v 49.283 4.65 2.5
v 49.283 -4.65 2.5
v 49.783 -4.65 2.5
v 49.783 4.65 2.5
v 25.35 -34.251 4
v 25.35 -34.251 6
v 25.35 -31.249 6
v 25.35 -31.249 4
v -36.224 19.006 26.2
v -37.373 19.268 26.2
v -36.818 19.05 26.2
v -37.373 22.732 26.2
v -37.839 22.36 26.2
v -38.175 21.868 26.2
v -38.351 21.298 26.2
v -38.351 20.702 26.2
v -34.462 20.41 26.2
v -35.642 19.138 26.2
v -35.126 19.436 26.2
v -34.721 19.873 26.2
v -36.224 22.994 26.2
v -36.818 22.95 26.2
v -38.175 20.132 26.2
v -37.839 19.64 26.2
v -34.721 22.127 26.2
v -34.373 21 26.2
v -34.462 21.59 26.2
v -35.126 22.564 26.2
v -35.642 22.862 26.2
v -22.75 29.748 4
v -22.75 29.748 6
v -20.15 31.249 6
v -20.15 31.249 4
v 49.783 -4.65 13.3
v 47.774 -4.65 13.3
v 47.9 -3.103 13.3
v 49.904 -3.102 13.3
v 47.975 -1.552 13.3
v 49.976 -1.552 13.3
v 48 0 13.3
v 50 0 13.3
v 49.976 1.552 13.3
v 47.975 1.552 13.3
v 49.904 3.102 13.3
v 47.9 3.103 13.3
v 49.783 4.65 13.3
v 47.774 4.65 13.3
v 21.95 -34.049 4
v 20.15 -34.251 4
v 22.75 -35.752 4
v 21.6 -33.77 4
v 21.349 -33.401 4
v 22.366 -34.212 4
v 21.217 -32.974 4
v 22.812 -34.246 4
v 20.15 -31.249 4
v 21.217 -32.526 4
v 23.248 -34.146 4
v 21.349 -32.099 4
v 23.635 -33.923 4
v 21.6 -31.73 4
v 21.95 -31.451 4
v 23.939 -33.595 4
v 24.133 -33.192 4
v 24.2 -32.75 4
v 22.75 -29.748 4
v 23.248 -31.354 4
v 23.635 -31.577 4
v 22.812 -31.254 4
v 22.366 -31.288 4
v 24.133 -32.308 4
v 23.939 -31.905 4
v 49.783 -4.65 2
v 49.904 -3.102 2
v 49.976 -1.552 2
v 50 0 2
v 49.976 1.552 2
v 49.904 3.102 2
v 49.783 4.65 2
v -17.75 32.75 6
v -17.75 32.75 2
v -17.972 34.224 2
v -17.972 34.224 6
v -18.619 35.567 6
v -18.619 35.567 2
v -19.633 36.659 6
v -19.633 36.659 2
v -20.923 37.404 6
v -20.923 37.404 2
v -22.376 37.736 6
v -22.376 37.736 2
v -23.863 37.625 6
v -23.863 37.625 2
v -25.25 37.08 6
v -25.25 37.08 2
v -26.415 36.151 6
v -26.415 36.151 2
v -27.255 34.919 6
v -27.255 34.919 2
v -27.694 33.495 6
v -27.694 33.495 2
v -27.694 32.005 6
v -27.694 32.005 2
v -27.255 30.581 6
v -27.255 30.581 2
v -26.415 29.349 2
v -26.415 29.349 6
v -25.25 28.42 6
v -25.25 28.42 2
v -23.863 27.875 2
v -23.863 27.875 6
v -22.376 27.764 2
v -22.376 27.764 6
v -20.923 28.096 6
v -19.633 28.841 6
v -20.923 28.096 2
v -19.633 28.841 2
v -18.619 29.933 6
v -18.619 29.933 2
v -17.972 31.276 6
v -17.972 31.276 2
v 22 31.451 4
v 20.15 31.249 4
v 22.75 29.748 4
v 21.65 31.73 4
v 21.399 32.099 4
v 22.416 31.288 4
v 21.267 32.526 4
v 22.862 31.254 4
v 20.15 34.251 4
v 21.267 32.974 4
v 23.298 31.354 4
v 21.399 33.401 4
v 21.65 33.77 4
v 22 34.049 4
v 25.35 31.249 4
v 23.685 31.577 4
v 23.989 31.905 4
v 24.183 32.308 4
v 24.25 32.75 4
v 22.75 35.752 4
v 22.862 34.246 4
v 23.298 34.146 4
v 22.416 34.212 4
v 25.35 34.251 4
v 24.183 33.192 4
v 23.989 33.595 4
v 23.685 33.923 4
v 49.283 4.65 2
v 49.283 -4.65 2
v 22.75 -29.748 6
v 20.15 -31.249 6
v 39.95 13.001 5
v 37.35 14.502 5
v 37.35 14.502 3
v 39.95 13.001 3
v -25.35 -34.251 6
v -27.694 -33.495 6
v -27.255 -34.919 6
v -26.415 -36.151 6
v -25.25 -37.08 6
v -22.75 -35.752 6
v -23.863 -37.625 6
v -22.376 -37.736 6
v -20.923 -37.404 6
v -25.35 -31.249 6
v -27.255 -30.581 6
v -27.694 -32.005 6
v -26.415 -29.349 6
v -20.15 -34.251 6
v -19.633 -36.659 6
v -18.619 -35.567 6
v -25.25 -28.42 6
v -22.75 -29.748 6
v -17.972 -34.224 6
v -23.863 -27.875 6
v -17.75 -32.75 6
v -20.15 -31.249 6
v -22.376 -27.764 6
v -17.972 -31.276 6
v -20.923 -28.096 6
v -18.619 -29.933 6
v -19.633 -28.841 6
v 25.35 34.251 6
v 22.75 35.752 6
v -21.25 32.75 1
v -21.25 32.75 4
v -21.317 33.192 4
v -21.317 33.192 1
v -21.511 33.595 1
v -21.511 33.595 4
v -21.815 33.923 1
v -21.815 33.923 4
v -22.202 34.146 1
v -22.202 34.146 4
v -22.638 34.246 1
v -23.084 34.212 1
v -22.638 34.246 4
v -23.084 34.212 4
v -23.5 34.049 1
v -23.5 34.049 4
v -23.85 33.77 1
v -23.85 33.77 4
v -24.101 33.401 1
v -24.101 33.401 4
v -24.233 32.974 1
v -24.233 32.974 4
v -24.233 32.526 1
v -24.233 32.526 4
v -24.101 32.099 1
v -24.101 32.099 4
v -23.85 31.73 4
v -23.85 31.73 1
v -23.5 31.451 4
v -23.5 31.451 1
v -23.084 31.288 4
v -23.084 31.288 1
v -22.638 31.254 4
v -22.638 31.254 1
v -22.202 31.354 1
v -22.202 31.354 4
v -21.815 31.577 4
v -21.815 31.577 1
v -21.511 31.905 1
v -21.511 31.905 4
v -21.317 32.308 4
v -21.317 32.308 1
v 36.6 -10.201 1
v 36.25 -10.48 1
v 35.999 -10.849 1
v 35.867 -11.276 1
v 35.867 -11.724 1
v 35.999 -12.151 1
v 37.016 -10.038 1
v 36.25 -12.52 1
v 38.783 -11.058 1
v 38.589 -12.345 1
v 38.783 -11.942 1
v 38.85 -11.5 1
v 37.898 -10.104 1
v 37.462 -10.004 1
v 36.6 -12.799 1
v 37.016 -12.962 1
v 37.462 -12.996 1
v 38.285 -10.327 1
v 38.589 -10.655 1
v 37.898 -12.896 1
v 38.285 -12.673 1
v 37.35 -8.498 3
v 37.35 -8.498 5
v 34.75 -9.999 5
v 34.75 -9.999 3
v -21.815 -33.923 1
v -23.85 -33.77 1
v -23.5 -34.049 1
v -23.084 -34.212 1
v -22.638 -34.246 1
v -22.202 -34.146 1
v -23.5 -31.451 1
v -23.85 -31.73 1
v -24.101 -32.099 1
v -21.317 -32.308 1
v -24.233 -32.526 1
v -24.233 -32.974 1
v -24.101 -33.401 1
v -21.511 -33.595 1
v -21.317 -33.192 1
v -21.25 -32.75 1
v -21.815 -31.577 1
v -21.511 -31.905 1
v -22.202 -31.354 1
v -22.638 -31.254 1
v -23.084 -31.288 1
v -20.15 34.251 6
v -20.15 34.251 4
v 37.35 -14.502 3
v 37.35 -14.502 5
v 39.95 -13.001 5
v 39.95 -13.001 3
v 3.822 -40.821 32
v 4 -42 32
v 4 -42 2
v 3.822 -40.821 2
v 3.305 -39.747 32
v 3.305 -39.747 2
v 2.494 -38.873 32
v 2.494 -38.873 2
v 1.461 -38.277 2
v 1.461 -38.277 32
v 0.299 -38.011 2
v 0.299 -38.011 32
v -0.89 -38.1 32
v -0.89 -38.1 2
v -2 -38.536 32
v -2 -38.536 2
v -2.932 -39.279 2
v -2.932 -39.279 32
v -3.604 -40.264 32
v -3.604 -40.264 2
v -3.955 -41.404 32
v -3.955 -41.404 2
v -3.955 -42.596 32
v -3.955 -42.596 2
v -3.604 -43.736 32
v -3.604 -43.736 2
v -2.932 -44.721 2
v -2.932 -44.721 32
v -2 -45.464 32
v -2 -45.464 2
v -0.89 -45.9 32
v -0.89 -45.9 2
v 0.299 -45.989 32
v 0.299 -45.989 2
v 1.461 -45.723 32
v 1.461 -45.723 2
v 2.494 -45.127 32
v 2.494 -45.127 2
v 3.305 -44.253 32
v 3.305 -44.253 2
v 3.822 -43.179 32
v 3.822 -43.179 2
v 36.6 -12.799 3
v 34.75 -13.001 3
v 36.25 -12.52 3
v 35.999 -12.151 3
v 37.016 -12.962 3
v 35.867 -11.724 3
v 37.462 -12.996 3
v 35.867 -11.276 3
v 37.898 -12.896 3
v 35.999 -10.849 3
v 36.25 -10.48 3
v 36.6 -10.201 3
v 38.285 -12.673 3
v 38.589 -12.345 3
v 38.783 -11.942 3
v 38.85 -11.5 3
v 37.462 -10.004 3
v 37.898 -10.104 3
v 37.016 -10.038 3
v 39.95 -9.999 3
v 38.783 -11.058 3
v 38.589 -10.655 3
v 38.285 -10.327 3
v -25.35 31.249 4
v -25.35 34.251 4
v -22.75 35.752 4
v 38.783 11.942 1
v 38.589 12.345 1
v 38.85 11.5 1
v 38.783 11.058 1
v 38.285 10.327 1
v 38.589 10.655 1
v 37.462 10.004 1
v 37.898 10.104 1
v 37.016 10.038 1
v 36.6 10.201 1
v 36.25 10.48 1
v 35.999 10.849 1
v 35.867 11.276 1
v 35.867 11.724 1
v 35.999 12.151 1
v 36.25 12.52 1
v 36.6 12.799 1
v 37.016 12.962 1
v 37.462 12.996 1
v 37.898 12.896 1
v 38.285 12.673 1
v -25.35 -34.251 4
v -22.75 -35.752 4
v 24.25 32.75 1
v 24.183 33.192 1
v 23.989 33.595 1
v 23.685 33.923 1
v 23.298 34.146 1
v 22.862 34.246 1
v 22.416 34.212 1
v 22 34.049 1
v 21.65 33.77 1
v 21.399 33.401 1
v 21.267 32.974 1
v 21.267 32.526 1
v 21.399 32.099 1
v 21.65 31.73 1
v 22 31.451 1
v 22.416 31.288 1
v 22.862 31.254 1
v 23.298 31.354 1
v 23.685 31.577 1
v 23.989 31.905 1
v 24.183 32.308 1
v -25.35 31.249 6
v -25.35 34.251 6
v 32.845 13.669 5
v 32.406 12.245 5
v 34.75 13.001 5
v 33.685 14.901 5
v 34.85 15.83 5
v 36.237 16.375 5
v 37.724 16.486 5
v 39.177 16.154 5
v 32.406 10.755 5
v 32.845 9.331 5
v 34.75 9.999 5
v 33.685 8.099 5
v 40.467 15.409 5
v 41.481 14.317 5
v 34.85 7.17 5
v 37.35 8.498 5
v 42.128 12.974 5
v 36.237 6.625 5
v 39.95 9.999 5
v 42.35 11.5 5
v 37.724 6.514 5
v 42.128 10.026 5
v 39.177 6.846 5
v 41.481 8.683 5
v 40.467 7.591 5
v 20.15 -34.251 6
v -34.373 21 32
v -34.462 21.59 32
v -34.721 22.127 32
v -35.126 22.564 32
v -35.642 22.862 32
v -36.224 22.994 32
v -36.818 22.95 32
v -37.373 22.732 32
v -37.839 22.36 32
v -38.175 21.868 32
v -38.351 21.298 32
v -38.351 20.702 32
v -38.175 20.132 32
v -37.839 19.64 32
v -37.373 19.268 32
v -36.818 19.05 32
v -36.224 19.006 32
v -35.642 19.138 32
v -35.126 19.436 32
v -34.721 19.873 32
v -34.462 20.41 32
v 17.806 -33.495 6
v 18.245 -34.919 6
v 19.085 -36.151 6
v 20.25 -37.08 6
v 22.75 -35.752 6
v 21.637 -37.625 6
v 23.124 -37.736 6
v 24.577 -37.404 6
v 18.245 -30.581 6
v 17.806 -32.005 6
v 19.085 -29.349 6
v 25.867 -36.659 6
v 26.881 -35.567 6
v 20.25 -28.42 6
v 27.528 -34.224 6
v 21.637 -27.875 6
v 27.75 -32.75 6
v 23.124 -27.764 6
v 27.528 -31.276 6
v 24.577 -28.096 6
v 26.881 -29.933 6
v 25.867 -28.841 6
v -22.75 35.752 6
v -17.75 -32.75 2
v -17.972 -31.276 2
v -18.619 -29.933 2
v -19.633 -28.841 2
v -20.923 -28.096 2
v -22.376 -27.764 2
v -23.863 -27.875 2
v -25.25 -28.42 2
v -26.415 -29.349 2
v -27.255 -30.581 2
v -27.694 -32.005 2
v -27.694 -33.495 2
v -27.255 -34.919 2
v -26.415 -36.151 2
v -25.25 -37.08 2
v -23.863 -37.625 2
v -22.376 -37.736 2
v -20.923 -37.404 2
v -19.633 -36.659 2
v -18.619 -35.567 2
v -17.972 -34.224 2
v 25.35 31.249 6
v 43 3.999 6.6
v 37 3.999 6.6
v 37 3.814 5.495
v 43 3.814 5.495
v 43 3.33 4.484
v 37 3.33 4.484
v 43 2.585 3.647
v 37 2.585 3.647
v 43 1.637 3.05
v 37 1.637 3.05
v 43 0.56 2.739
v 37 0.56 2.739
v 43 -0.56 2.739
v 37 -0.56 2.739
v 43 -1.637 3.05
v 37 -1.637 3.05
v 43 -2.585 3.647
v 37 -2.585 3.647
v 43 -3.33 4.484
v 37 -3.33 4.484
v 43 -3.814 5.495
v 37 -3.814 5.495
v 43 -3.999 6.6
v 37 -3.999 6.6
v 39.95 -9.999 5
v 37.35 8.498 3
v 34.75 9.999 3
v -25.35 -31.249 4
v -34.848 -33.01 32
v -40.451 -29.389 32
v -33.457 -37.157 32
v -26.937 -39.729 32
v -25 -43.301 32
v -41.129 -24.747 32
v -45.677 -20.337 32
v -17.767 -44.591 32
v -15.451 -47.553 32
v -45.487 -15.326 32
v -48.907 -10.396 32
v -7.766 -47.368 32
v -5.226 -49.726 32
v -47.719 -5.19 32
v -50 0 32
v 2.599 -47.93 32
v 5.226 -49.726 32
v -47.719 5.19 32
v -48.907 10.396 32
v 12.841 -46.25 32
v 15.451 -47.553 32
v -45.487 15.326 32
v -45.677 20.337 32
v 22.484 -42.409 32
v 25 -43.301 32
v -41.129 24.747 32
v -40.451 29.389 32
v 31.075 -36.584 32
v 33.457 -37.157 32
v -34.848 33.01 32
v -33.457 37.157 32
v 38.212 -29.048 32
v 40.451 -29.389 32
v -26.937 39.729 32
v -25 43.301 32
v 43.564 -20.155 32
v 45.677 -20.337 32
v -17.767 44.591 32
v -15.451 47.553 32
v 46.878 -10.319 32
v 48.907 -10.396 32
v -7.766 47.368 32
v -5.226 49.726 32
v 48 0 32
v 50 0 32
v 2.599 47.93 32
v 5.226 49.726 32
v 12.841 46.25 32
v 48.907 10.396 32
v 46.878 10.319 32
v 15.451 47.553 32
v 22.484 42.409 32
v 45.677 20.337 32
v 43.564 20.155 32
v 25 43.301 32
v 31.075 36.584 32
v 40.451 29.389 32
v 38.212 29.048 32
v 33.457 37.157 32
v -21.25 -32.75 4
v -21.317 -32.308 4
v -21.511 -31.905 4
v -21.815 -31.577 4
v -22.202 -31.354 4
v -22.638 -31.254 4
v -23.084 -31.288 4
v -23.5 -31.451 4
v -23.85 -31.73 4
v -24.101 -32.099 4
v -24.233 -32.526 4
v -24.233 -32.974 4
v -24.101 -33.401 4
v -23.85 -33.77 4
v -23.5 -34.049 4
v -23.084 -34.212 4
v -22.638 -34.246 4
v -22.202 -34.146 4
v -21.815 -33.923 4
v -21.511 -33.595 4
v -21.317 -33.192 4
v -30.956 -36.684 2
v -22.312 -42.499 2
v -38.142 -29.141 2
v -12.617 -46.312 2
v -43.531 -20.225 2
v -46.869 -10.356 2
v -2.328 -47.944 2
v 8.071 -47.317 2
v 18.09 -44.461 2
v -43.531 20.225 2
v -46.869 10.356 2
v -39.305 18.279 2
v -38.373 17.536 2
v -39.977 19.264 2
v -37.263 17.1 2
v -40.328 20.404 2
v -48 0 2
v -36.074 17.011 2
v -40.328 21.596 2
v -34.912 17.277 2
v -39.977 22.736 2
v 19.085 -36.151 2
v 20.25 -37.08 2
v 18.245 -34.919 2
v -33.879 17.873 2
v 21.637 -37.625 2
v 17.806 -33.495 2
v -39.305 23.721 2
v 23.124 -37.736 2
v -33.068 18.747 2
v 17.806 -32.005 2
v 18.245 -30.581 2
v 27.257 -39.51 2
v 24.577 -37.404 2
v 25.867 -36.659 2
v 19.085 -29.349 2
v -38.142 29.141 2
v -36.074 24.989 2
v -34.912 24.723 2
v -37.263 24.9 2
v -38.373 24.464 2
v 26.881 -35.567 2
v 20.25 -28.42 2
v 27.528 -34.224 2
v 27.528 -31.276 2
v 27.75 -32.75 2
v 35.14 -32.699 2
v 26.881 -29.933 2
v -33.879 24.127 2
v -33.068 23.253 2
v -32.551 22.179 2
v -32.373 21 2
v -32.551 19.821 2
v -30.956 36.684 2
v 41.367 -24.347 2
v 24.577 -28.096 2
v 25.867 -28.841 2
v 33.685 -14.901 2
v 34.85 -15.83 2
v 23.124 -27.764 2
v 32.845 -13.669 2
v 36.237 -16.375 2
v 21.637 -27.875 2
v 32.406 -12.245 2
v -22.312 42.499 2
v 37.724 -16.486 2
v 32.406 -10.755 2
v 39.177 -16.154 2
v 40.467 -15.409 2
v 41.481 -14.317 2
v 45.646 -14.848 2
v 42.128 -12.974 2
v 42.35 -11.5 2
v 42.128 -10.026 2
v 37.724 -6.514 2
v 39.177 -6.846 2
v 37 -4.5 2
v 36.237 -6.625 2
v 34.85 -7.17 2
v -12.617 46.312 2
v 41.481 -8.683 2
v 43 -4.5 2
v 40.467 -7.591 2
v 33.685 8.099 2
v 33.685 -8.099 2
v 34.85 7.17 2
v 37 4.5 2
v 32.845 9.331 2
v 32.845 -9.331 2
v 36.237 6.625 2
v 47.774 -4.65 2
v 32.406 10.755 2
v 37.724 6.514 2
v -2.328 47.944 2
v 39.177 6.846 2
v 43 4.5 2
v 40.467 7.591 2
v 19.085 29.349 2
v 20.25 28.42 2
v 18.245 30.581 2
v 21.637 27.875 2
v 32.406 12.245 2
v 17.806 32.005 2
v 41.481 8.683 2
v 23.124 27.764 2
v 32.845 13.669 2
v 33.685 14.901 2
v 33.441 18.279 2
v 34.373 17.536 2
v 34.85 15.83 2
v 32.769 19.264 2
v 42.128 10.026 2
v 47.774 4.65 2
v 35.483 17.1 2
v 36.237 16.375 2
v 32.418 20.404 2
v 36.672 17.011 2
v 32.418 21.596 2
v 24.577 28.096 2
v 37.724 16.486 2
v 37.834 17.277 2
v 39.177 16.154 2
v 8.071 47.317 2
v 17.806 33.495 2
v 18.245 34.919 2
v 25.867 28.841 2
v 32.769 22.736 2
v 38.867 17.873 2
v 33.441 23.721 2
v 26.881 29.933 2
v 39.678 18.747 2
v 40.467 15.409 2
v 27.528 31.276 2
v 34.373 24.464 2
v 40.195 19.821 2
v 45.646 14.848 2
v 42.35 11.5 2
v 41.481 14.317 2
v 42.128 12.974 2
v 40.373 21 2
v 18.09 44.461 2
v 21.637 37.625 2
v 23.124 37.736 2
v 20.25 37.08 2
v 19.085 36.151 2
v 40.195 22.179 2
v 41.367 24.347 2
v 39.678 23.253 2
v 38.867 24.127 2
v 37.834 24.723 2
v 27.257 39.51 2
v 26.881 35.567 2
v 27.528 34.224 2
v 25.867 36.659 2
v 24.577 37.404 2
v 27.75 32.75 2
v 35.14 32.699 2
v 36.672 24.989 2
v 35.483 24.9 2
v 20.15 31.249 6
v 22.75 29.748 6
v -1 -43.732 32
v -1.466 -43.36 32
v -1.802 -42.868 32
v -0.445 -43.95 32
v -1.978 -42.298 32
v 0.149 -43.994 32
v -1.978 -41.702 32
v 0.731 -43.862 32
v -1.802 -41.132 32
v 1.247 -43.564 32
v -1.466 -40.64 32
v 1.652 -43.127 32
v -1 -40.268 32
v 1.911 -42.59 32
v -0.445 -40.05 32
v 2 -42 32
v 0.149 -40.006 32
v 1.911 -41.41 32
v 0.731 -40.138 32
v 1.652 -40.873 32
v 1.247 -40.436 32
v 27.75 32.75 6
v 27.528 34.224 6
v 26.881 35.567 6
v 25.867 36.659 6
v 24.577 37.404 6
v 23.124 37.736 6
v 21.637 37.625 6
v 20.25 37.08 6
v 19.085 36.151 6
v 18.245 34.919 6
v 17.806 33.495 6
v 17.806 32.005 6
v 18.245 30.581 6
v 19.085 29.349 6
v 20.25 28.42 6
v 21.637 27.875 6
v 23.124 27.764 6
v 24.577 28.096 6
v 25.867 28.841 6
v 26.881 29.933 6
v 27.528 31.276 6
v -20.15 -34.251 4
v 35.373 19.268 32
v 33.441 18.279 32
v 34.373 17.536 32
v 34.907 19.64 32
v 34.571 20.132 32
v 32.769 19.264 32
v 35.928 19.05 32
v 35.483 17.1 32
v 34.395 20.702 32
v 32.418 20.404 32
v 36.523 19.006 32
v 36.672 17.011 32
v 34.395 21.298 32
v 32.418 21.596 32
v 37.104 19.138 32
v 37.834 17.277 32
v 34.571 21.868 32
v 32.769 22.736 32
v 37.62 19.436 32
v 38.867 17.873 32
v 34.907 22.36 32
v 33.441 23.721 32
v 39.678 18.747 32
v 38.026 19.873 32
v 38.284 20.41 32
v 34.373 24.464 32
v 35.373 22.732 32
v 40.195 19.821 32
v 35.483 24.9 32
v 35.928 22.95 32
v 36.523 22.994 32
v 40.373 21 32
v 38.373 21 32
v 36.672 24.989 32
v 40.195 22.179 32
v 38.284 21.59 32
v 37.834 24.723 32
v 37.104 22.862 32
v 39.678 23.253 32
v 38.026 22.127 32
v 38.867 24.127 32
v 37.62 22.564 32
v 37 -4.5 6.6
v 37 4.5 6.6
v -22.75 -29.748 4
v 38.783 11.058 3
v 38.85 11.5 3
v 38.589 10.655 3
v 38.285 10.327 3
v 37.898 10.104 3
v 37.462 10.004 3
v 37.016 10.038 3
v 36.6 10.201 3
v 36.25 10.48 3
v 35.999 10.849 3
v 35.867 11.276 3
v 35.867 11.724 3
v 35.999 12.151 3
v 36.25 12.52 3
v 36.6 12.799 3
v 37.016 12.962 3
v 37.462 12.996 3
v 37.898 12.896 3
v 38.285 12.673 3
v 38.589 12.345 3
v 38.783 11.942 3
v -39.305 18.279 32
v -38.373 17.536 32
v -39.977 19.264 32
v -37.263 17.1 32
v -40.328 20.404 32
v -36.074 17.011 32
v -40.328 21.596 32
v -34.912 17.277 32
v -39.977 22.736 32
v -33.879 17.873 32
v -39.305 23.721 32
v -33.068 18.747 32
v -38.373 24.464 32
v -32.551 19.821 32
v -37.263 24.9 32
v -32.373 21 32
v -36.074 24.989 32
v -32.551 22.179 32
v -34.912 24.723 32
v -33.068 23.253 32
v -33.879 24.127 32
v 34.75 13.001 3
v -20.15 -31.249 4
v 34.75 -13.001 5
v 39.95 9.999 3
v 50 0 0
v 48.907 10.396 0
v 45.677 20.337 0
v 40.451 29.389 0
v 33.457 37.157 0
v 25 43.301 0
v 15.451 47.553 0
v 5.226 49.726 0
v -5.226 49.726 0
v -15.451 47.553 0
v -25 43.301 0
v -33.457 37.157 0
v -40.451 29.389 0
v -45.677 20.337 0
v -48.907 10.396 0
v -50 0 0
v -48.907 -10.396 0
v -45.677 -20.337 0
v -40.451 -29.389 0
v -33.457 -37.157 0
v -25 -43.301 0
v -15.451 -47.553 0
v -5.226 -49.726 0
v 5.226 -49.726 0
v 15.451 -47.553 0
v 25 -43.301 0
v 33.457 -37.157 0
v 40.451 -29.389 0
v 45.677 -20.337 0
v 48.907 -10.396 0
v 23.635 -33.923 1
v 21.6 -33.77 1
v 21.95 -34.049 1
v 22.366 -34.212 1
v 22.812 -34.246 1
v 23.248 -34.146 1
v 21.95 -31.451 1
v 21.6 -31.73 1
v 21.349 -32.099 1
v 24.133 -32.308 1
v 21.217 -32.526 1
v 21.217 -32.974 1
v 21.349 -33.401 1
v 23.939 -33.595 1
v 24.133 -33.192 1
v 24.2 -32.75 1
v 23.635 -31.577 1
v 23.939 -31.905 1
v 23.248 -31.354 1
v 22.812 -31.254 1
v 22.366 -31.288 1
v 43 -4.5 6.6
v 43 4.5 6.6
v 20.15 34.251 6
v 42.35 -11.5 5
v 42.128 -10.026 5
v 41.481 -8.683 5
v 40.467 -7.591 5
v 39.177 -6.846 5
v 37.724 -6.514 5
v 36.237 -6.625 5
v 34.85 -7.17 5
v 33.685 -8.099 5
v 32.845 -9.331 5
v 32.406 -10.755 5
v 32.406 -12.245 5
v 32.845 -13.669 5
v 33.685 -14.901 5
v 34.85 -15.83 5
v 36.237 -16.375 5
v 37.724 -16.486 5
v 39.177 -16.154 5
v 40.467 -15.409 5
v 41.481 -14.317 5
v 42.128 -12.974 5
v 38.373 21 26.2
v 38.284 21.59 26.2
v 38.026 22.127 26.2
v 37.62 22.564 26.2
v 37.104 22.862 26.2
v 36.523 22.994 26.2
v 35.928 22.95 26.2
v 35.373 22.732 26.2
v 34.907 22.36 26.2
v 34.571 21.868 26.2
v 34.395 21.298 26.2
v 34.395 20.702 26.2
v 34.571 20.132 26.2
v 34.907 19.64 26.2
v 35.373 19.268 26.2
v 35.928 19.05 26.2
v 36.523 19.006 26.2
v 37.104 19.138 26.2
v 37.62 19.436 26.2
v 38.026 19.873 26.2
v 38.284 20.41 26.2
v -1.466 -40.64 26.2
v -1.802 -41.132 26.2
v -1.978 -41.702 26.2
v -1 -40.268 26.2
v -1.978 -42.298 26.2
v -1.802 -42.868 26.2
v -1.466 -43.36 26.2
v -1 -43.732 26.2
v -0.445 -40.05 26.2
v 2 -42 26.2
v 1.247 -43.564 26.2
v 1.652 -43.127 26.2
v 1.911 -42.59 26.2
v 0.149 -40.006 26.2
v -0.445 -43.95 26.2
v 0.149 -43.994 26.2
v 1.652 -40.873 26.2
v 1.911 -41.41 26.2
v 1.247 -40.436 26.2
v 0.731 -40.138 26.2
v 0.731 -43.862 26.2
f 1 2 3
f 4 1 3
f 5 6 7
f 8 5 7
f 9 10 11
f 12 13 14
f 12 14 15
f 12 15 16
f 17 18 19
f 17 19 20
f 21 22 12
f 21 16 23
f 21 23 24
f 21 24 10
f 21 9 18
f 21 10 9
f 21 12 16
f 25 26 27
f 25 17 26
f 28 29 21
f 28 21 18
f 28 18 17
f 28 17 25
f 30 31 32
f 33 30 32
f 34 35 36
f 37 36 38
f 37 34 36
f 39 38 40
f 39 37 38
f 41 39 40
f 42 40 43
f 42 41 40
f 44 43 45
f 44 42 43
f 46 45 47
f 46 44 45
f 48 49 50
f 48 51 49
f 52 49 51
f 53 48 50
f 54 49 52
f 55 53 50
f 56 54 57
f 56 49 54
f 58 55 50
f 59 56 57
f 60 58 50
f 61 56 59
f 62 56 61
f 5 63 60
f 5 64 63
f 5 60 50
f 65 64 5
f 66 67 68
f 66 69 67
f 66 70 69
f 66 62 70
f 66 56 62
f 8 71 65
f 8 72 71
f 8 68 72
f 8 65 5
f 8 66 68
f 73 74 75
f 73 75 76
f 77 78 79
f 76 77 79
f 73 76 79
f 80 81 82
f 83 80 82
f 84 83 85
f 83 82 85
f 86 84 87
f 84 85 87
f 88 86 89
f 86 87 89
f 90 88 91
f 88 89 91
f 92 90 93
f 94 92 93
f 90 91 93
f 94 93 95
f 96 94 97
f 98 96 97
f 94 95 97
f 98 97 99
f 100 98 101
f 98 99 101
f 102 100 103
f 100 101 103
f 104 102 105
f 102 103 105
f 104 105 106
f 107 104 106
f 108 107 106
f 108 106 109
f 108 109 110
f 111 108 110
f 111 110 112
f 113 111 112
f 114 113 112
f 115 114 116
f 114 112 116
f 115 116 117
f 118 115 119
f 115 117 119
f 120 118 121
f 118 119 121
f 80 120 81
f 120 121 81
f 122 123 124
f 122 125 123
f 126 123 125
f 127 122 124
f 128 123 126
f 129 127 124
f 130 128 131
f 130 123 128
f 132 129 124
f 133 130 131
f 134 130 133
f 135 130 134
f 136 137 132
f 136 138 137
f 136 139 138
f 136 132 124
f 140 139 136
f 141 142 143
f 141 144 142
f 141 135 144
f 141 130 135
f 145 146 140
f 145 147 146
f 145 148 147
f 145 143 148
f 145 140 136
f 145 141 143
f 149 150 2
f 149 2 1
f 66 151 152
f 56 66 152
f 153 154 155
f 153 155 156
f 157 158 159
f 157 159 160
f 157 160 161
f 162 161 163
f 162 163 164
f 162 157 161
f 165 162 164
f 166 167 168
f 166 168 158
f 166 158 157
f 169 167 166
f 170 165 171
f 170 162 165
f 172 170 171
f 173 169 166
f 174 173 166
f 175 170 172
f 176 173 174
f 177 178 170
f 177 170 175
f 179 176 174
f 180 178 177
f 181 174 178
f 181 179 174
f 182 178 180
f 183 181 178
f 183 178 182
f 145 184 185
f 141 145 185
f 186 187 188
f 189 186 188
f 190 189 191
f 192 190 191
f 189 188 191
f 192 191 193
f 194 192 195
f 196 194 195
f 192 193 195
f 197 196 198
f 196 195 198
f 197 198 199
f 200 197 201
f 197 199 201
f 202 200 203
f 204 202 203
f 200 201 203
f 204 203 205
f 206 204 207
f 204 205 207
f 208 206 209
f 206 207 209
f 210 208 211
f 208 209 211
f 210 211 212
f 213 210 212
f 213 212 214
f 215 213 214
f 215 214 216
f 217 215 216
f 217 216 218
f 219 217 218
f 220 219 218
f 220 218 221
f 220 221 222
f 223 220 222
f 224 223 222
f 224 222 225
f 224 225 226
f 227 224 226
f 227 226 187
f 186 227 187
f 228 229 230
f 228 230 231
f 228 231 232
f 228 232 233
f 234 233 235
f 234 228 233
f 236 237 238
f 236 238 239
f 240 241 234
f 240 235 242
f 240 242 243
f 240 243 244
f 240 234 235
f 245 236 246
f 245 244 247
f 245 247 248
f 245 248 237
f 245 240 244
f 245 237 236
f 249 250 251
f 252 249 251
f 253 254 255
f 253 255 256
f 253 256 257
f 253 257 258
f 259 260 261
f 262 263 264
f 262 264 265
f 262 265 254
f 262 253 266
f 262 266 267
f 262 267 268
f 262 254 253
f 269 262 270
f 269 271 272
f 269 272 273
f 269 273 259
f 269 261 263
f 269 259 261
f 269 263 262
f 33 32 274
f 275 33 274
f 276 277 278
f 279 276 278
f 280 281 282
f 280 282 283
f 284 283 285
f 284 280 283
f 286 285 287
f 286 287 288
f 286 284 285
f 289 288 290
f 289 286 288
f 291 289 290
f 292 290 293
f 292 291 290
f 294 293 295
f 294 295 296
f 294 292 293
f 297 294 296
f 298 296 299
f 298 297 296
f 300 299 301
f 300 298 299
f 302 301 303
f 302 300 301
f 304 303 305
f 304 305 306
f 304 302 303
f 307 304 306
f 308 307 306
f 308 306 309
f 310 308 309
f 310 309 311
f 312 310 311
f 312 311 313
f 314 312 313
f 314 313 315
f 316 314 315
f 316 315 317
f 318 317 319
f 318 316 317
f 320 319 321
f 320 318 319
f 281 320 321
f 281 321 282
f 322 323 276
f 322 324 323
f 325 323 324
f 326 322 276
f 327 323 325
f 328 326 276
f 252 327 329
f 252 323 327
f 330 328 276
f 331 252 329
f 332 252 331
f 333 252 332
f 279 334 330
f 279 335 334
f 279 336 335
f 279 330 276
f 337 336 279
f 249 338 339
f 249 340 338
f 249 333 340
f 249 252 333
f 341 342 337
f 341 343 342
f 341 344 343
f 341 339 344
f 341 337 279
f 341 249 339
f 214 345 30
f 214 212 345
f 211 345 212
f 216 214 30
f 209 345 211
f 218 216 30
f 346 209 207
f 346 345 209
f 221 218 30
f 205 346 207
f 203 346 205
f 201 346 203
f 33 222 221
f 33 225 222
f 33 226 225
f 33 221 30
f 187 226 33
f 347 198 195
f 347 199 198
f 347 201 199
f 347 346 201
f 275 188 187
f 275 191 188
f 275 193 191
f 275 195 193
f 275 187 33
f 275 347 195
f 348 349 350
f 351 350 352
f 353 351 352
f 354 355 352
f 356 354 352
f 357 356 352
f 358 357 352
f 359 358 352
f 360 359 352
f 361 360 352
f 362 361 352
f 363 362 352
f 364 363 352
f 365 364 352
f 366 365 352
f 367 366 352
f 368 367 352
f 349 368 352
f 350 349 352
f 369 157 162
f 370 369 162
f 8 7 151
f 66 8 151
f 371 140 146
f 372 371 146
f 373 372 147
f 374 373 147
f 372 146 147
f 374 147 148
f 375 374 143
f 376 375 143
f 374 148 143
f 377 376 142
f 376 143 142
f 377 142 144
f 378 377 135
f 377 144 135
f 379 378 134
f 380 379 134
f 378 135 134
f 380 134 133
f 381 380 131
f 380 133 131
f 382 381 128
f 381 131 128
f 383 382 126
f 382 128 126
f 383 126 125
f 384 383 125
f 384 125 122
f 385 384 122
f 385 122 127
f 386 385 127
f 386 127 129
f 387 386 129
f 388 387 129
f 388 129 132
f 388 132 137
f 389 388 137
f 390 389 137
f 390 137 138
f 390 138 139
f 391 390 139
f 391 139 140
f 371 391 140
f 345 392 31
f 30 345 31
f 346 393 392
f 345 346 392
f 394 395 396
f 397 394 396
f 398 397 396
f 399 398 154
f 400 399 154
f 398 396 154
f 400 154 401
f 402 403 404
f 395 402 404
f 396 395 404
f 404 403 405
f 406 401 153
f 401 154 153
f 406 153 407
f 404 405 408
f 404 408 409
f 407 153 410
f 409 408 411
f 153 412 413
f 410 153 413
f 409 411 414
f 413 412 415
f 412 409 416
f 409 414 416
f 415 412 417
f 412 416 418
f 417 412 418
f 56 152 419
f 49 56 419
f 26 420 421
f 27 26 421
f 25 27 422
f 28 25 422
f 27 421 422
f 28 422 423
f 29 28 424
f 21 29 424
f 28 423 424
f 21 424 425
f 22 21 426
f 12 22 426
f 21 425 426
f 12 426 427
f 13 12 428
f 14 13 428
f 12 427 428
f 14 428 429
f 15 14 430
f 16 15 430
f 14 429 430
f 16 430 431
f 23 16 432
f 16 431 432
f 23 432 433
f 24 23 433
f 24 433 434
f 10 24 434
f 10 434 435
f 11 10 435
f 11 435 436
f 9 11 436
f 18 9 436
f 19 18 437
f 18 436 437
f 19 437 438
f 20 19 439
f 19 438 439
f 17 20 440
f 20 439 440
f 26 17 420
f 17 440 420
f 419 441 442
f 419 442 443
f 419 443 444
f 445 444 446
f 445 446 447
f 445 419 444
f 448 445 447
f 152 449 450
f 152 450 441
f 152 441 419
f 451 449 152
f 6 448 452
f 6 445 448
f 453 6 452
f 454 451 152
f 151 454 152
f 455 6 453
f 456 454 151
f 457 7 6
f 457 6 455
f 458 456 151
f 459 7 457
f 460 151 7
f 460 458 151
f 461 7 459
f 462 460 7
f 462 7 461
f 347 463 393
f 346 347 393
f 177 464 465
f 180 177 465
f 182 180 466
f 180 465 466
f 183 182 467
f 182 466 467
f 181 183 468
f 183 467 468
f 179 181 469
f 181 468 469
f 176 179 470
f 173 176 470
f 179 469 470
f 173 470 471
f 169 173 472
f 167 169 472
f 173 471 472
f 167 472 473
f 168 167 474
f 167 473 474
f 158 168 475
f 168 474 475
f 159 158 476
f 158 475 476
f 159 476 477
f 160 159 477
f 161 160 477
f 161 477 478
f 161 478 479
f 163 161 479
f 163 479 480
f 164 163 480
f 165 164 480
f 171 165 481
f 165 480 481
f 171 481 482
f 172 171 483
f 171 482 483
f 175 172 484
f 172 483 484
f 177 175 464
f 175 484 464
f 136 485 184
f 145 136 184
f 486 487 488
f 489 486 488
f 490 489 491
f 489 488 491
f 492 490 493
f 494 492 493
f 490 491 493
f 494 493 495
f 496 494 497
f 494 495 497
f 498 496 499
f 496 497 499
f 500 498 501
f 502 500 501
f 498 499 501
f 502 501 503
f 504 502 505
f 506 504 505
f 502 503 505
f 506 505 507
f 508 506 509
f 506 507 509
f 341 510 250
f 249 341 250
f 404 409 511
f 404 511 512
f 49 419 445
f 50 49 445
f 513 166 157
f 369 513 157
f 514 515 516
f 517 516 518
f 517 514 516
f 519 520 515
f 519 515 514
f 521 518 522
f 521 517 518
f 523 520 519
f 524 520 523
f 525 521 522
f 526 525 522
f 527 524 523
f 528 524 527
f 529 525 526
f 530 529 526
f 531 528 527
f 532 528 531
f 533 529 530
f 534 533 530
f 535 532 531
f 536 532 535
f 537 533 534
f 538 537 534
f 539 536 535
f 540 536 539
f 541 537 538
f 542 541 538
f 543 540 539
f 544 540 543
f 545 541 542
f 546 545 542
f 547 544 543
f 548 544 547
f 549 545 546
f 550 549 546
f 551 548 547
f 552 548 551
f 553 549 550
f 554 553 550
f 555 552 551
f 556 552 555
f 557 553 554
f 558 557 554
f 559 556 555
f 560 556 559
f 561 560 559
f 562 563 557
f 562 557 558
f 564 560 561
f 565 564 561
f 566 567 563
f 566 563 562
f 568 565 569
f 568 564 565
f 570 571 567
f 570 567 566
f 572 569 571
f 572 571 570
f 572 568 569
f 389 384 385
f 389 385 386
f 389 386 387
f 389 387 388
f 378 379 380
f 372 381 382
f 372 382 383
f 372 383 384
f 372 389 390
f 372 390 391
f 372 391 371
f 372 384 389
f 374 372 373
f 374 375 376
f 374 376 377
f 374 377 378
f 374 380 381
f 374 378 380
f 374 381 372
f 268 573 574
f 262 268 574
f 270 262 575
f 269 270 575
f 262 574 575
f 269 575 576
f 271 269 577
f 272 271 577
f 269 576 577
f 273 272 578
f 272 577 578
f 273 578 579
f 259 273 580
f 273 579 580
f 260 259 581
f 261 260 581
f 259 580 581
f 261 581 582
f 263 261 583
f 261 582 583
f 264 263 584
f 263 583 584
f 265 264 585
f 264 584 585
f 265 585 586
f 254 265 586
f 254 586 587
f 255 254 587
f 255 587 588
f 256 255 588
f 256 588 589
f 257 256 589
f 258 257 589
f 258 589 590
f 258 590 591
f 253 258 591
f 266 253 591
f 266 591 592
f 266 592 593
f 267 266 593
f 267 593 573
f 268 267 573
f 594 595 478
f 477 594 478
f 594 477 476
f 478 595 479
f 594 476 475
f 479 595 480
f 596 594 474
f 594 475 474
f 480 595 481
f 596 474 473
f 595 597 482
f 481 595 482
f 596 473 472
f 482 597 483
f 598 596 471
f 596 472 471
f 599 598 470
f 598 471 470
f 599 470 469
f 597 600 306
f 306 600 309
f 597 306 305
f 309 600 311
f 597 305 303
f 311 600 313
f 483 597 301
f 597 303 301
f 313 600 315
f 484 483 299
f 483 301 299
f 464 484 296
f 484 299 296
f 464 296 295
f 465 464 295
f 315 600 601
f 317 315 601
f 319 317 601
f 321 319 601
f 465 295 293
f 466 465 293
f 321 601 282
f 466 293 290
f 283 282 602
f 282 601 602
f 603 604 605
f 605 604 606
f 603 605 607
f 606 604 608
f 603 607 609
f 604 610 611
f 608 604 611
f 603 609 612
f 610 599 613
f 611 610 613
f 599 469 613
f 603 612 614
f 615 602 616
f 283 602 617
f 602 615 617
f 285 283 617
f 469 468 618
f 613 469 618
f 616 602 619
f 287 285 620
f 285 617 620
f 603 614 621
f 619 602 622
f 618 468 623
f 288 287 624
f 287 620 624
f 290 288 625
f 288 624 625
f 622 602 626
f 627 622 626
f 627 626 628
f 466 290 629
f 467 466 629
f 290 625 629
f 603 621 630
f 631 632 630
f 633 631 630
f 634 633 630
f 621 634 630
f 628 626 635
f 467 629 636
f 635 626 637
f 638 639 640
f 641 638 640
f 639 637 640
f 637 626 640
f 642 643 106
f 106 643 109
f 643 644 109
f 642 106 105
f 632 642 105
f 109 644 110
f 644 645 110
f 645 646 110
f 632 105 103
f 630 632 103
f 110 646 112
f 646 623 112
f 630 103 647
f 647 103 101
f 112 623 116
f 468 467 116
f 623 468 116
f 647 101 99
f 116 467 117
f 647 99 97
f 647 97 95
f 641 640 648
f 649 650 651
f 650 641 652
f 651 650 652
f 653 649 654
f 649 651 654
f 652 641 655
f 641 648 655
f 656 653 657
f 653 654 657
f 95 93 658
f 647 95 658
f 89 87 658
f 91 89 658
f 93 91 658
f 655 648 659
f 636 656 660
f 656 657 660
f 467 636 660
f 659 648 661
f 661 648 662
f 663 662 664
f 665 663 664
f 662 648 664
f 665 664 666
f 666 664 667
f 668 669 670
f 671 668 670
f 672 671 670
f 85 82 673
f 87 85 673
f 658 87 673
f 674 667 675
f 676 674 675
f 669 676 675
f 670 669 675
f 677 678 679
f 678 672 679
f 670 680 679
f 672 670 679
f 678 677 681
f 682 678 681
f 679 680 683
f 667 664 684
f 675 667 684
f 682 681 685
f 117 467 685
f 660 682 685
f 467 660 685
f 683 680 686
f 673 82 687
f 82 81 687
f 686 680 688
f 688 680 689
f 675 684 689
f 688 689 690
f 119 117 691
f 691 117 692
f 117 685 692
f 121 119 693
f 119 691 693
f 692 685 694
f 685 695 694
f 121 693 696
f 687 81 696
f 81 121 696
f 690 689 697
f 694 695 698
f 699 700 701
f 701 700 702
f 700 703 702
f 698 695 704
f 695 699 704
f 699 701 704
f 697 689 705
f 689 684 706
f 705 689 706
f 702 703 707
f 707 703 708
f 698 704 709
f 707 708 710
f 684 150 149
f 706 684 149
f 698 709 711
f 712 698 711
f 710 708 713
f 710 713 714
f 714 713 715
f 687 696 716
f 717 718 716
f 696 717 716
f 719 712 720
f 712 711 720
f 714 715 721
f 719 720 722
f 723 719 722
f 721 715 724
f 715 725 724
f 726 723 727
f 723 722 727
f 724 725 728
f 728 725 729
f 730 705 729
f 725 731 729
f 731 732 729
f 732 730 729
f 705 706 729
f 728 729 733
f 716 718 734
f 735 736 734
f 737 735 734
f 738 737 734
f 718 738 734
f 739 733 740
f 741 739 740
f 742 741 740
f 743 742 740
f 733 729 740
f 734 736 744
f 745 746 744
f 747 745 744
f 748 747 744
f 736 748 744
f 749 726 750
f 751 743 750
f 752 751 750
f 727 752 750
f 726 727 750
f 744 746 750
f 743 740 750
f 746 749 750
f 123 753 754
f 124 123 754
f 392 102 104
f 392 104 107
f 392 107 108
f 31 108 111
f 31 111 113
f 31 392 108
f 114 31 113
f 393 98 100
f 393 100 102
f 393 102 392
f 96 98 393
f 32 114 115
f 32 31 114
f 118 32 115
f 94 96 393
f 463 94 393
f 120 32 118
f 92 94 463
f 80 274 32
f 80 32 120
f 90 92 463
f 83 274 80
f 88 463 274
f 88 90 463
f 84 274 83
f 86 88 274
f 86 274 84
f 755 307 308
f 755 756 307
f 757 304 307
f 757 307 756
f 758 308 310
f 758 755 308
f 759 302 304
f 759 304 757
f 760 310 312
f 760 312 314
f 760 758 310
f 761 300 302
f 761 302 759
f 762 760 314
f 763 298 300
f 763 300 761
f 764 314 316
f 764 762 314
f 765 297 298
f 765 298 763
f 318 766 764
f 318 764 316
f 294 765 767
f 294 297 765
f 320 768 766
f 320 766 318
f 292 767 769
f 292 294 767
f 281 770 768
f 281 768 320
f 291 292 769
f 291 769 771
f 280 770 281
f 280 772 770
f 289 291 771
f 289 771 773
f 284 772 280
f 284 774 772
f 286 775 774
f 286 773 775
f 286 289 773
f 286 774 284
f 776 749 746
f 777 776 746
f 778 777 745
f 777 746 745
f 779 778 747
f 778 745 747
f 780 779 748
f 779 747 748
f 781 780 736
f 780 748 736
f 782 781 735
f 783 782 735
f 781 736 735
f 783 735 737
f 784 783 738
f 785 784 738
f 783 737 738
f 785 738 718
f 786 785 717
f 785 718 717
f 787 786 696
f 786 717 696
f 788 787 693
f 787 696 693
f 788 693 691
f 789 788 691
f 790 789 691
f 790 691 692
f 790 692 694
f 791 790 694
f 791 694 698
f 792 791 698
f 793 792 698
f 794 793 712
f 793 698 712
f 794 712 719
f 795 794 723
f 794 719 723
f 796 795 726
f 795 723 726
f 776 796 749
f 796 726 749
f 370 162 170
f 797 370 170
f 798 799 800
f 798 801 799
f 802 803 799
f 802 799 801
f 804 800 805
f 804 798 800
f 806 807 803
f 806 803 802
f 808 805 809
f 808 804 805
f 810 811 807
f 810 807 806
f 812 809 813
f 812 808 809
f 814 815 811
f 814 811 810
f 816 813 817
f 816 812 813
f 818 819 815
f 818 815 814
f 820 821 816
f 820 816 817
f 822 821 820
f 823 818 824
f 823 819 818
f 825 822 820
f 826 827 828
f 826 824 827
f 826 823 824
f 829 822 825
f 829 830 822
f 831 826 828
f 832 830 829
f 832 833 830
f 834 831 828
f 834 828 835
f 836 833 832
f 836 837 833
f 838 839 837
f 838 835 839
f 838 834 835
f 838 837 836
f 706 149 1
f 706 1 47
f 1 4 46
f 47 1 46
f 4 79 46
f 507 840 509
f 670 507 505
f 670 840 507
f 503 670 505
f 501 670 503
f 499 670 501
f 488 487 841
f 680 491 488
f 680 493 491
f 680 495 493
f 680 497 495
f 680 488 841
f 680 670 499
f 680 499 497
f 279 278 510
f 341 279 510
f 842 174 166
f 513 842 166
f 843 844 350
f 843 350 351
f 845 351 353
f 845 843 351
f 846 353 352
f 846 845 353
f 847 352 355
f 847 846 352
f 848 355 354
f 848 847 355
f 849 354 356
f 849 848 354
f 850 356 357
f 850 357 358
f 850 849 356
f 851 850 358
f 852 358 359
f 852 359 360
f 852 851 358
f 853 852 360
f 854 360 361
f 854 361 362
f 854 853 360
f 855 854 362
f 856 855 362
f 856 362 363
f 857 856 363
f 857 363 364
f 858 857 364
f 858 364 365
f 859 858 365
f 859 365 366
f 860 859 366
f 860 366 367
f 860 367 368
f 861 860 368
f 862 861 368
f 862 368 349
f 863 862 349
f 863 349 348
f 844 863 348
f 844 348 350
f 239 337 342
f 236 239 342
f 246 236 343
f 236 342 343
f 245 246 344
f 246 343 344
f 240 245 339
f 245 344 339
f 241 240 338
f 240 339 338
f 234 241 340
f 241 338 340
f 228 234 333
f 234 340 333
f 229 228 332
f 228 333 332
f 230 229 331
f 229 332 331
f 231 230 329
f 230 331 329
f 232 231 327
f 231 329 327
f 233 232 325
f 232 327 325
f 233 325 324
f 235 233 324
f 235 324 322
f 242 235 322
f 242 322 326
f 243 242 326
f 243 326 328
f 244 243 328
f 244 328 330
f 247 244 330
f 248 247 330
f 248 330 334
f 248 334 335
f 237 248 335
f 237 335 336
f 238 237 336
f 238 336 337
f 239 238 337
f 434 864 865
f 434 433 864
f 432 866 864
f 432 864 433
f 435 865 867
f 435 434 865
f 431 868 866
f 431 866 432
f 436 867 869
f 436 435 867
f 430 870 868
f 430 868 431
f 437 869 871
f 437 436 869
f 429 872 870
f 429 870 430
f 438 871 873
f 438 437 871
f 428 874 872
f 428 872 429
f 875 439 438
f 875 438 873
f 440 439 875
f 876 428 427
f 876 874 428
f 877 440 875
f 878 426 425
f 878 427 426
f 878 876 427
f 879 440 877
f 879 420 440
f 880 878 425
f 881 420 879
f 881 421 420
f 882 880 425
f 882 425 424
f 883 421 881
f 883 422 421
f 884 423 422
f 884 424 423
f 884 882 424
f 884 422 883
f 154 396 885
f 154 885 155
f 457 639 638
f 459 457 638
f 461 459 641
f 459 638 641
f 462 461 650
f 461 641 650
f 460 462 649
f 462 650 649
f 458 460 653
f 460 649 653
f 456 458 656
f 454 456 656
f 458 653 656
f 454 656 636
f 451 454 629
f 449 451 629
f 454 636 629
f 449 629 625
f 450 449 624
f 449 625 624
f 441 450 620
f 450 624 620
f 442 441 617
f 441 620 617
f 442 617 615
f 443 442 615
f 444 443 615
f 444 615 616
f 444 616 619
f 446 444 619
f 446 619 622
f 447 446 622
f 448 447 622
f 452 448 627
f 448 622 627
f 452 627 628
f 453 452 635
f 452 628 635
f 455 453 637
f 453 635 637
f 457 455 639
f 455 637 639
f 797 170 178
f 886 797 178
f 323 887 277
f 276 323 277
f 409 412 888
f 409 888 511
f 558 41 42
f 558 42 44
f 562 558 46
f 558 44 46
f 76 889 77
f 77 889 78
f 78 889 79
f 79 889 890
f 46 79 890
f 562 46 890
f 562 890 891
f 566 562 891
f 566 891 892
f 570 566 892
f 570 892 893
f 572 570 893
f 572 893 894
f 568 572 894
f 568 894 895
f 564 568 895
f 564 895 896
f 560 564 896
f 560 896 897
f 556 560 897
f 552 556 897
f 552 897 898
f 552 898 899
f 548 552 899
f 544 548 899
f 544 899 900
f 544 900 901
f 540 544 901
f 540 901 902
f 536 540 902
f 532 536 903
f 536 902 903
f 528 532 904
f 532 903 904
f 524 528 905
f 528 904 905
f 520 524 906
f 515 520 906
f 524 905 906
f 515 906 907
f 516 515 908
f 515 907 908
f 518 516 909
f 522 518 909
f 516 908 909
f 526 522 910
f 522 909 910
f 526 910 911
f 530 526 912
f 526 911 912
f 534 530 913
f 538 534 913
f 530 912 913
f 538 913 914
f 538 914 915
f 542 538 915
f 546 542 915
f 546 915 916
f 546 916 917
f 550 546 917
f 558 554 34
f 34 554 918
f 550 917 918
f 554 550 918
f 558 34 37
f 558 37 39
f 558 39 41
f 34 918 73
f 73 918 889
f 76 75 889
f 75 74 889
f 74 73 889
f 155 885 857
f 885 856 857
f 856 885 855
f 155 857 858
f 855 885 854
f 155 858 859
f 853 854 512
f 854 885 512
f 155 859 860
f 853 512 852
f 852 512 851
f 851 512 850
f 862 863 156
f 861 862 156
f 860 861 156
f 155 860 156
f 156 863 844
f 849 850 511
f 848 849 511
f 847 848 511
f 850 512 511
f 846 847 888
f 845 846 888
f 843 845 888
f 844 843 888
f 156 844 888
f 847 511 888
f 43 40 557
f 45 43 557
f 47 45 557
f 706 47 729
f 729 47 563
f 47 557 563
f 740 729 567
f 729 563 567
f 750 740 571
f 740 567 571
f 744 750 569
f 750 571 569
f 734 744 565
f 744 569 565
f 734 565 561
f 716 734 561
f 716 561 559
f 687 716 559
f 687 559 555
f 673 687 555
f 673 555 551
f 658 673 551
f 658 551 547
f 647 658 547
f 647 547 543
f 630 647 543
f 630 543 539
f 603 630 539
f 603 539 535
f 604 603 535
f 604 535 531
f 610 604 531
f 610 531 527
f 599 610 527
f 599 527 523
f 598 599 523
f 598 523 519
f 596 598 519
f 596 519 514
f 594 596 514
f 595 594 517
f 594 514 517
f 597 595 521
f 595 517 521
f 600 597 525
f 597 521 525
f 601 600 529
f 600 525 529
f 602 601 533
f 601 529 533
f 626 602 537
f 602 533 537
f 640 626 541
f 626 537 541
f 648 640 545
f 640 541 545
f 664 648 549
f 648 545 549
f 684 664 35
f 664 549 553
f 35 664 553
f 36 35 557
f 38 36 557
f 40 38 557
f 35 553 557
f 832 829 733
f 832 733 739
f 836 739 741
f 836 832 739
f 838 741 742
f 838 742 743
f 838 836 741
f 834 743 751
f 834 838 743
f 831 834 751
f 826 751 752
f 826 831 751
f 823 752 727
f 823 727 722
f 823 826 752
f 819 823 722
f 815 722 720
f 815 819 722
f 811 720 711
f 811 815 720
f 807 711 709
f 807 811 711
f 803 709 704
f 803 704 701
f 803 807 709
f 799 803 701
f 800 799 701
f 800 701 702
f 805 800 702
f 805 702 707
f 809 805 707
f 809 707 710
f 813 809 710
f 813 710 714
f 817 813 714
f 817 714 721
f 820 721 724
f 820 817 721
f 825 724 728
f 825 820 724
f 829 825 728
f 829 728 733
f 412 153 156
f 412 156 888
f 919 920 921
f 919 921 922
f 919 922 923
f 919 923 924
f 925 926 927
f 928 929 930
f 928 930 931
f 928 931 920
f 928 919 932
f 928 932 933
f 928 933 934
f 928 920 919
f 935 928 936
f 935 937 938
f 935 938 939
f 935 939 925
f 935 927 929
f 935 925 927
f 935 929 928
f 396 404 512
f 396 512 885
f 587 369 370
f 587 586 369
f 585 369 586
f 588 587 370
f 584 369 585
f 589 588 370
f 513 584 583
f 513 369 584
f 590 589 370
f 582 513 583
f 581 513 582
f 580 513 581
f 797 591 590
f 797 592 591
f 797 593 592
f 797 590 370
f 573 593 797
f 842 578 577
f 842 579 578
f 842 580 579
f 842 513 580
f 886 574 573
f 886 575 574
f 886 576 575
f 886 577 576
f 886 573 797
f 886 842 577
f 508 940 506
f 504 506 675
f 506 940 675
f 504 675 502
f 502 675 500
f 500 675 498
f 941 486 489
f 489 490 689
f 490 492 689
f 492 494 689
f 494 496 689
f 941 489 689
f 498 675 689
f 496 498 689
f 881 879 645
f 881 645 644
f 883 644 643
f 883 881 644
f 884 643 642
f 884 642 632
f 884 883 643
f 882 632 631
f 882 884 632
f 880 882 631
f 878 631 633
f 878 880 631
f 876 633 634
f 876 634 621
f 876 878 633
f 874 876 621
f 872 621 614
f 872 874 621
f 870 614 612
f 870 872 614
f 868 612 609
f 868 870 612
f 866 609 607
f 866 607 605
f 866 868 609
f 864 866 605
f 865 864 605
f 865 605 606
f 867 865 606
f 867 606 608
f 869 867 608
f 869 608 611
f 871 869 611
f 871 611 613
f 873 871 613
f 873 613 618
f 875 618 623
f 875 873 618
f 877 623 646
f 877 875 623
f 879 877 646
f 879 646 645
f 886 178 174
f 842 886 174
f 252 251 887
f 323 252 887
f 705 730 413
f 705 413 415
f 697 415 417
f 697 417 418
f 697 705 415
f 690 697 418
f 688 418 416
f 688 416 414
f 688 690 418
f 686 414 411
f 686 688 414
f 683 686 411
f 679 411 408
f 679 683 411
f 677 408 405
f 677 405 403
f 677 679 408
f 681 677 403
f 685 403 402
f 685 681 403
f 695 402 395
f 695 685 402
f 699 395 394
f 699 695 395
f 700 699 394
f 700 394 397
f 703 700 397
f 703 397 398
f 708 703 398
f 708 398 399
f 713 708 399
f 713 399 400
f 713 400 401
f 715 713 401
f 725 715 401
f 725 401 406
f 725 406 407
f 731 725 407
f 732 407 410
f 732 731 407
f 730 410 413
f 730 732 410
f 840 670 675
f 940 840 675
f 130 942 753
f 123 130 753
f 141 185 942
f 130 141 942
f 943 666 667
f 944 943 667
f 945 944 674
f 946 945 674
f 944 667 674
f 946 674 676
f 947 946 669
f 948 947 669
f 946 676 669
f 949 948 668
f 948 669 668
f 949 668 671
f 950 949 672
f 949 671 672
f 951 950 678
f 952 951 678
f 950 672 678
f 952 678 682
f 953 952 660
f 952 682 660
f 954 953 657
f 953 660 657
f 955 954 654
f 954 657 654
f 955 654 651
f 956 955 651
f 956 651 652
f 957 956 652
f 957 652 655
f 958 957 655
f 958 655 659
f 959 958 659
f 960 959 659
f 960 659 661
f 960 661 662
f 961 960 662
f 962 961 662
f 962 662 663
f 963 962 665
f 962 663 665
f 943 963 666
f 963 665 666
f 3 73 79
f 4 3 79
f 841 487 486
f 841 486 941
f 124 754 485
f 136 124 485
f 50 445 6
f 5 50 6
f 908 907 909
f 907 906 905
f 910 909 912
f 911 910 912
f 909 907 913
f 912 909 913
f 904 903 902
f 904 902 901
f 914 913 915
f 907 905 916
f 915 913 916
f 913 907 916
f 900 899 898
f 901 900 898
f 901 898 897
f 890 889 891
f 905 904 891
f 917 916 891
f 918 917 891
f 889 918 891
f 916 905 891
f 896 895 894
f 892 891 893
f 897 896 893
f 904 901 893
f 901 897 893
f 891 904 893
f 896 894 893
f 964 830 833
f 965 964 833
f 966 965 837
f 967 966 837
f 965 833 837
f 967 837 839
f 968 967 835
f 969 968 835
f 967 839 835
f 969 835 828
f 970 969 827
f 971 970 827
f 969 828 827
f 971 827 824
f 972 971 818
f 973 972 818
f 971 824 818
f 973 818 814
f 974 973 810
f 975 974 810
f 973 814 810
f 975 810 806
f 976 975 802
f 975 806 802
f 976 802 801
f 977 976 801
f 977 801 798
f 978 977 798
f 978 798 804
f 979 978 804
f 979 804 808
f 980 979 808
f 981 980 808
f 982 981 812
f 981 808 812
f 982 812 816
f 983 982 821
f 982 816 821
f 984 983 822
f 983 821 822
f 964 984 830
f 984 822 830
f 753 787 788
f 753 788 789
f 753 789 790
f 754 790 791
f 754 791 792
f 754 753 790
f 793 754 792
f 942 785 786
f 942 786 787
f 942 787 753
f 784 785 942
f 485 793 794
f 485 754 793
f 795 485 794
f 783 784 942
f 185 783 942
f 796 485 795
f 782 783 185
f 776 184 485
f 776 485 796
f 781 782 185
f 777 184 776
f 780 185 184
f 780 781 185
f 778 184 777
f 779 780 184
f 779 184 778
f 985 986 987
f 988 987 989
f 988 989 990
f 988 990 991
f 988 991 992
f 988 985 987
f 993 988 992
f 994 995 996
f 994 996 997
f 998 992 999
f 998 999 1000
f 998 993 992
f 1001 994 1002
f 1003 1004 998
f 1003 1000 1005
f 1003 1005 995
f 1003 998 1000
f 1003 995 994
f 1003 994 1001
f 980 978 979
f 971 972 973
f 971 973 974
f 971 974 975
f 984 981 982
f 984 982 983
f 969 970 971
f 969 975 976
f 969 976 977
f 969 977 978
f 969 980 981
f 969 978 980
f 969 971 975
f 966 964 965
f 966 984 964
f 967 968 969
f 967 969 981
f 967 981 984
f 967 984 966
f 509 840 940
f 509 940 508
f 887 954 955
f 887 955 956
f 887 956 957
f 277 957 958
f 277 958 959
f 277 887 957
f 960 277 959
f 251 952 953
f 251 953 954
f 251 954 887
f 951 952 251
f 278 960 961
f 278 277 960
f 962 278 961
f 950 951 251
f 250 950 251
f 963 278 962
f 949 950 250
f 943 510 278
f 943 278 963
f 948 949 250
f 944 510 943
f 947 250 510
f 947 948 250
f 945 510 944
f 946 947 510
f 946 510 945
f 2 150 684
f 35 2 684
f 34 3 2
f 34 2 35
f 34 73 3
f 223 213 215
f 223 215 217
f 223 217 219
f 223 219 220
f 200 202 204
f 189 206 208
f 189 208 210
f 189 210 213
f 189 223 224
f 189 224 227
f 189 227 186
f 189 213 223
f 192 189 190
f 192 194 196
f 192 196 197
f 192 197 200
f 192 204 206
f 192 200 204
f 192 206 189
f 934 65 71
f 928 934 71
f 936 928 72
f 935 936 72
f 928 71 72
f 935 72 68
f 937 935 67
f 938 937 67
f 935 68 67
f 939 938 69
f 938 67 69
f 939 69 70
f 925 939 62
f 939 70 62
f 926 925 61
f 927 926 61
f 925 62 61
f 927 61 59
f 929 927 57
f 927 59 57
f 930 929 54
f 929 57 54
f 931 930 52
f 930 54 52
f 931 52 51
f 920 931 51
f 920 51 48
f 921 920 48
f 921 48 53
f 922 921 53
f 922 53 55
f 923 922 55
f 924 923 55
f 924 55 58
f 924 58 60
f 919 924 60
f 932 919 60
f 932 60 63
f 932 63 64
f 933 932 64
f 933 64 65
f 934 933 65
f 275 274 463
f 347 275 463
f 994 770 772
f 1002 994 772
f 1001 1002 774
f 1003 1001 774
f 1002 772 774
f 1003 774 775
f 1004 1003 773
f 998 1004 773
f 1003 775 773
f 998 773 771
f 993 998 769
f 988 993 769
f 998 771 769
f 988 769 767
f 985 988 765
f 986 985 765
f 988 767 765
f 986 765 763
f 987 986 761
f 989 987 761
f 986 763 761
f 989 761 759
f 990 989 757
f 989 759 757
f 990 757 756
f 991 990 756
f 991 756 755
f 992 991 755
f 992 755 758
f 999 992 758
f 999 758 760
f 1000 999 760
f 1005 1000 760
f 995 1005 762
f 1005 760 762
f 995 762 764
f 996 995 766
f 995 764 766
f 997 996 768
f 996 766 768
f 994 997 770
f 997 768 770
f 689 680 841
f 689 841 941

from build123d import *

# Parameters (mm, degrees)
SKETCH_R        = 50
PAD_DEPTH       = 32
SKETCH001_R     = 48
POCKET_DEPTH    = 30
SKETCH002_R     = 4
PAD001_DEPTH    = 30
SKETCH005_W     = 9.3
SKETCH005_H     = 11.3
POCKET001_DEPTH = 10
SKETCH006_W     = 6
SKETCH006_H     = 9
PAD004_DEPTH    = 10
POCKET002_DEPTH = 8
SKETCH009_R     = 5
PAD006_DEPTH    = 4
SKETCH011_W     = 0.5
SKETCH011_H     = 9.3
PAD007_DEPTH    = 0.5
SKETCH012_R     = 5
PAD008_DEPTH    = 3
POCKET004_DEPTH = 2
SKETCH014_R     = 1.5
POCKET005_DEPTH = 4
POCKET006_DEPTH = 2
SKETCH015_R     = 1.5
POCKET007_DEPTH = 5
SKETCH016_R     = 2
POCKET008_DEPTH = 5.8


with BuildPart() as part:
    # Sketch → Pad (new body)
    with BuildSketch(Plane.XY):
        Circle(SKETCH_R)
    extrude(amount=PAD_DEPTH)

    # Sketch001 (on DatumPlane) → Pocket (cut)
    with BuildSketch(Plane.XY.offset(32)):
        Circle(SKETCH001_R)
    extrude(amount=-POCKET_DEPTH, mode=Mode.SUBTRACT)

    # Sketch002 (on DatumPlane) → Pad001 (join)
    with BuildSketch(Plane.XY.offset(32)):
        with Locations((-36.373067, 21)):
            Circle(SKETCH002_R)
        with Locations((0, -42)):
            Circle(SKETCH002_R)
        with Locations((36.373067, 21)):
            Circle(SKETCH002_R)
    extrude(amount=-PAD001_DEPTH)

    # Sketch005 (on DatumPlane) → Pocket001 (cut)
    with BuildSketch(Plane.YZ.offset(50)):
        with Locations((0, 7.65)):
            Rectangle(SKETCH005_W, SKETCH005_H)
    extrude(amount=-POCKET001_DEPTH, mode=Mode.SUBTRACT)

    # Sketch006 (on DatumPlane) → Pad004 (join)
    with BuildSketch(Plane.XY.offset(2)):
        with Locations((40, 0)):
            Rectangle(SKETCH006_W, SKETCH006_H)
    extrude(amount=PAD004_DEPTH)

    # Sketch007 (on Face14 of Pad004) → Pocket002 (cut)
    with BuildSketch(Plane(origin=(37, 0, 0), x_dir=(0, -1, 0), z_dir=(-1, 0, 0))):
        with BuildLine():
            ThreePointArc((-3.99875, 6.6), (0, 2.7), (3.99875, 6.6))
            Line((5.575286, 6.6), (3.99875, 6.6))
            Line((5.575286, 15.969053), (5.575286, 6.6))
            Line((-6.906295, 15.969053), (5.575286, 15.969053))
            Line((-6.906295, 6.6), (-6.906295, 15.969053))
            Line((-3.99875, 6.6), (-6.906295, 6.6))
        make_face()
    extrude(amount=-POCKET002_DEPTH, mode=Mode.SUBTRACT)

    # Sketch009 (on DatumPlane) → Pad006 (join)
    with BuildSketch(Plane.XY.offset(2)):
        with Locations((-22.75, 32.75)):
            Circle(SKETCH009_R)
        with Locations((22.75, 32.75)):
            Circle(SKETCH009_R)
        with Locations((22.75, -32.75)):
            Circle(SKETCH009_R)
        with Locations((-22.75, -32.75)):
            Circle(SKETCH009_R)
    extrude(amount=PAD006_DEPTH)

    # Sketch011 (on DatumPlane) → Pad007 (join)
    with BuildSketch(Plane.XY.offset(2)):
        with Locations((49.533305, 0)):
            Rectangle(SKETCH011_W, SKETCH011_H)
    extrude(amount=PAD007_DEPTH)

    # Sketch012 (on DatumPlane) → Pad008 (join)
    with BuildSketch(Plane.XY.offset(2)):
        with Locations((37.35, -11.5)):
            Circle(SKETCH012_R)
    pad008 = extrude(amount=PAD008_DEPTH)

    # Sketch013 (on Face33 of Pad008) → Pocket004 (cut)
    with BuildSketch(Plane.XY.offset(5)):
        Polygon((39.95, -13.001111), (39.95, -9.998889), (37.35, -8.497779), (34.75, -9.998889), (34.75, -13.001111), (37.35, -14.502221), align=None)
    pocket004 = extrude(amount=-POCKET004_DEPTH, mode=Mode.SUBTRACT)

    # Sketch014 (on Face33 of Pocket004) → Pocket005 (cut)
    with BuildSketch(Plane.XY.offset(5)):
        with Locations((37.35, -11.5)):
            Circle(SKETCH014_R)
    pocket005 = extrude(amount=-POCKET005_DEPTH, mode=Mode.SUBTRACT)

    # Sketch010 (on DatumPlane) → Pocket006 (cut)
    with BuildSketch(Plane.XY.offset(6)):
        Polygon((-20.15, 31.248889), (-20.15, 34.251111), (-22.75, 35.752221), (-25.35, 34.251111), (-25.35, 31.248889), (-22.75, 29.747779), align=None)
        Polygon((25.35, -34.251111), (25.35, -31.248889), (22.75, -29.747779), (20.15, -31.248889), (20.15, -34.251111), (22.75, -35.752221), align=None)
        Polygon((22.75, 35.752221), (20.15, 34.251111), (20.15, 31.248889), (22.75, 29.747779), (25.35, 31.248889), (25.35, 34.251111), align=None)
        Polygon((-20.15, -31.248889), (-22.75, -29.747779), (-25.35, -31.248889), (-25.35, -34.251111), (-22.75, -35.752221), (-20.15, -34.251111), align=None)
    extrude(amount=-POCKET006_DEPTH, mode=Mode.SUBTRACT)

    # Sketch015 (on DatumPlane) → Pocket007 (cut)
    with BuildSketch(Plane.XY.offset(6)):
        with Locations((-22.75, 32.75)):
            Circle(SKETCH015_R)
        with Locations((22.75, 32.75)):
            Circle(SKETCH015_R)
        with Locations((22.7, -32.75)):
            Circle(SKETCH015_R)
        with Locations((-22.75, -32.75)):
            Circle(SKETCH015_R)
    extrude(amount=-POCKET007_DEPTH, mode=Mode.SUBTRACT)

    # Sketch016 (on DatumPlane) → Pocket008 (cut)
    with BuildSketch(Plane.XY.offset(32)):
        with Locations((-36.373067, 21)):
            Circle(SKETCH016_R)
        with Locations((36.373067, 21)):
            Circle(SKETCH016_R)
        with Locations((0, -42)):
            Circle(SKETCH016_R)
    extrude(amount=-POCKET008_DEPTH, mode=Mode.SUBTRACT)

    # Mirrored: Pad008, Pocket004, Pocket005 across Sketch012 H_Axis
    add(pad008.mirror(Plane(origin=(0, 0, 2), x_dir=(0, 0, 1), z_dir=(0, 1, 0))))
    add(pocket004.mirror(Plane(origin=(0, 0, 2), x_dir=(0, 0, 1), z_dir=(0, 1, 0))), mode=Mode.SUBTRACT)
    add(pocket005.mirror(Plane(origin=(0, 0, 2), x_dir=(0, 0, 1), z_dir=(0, 1, 0))), mode=Mode.SUBTRACT)


solid = part.part
